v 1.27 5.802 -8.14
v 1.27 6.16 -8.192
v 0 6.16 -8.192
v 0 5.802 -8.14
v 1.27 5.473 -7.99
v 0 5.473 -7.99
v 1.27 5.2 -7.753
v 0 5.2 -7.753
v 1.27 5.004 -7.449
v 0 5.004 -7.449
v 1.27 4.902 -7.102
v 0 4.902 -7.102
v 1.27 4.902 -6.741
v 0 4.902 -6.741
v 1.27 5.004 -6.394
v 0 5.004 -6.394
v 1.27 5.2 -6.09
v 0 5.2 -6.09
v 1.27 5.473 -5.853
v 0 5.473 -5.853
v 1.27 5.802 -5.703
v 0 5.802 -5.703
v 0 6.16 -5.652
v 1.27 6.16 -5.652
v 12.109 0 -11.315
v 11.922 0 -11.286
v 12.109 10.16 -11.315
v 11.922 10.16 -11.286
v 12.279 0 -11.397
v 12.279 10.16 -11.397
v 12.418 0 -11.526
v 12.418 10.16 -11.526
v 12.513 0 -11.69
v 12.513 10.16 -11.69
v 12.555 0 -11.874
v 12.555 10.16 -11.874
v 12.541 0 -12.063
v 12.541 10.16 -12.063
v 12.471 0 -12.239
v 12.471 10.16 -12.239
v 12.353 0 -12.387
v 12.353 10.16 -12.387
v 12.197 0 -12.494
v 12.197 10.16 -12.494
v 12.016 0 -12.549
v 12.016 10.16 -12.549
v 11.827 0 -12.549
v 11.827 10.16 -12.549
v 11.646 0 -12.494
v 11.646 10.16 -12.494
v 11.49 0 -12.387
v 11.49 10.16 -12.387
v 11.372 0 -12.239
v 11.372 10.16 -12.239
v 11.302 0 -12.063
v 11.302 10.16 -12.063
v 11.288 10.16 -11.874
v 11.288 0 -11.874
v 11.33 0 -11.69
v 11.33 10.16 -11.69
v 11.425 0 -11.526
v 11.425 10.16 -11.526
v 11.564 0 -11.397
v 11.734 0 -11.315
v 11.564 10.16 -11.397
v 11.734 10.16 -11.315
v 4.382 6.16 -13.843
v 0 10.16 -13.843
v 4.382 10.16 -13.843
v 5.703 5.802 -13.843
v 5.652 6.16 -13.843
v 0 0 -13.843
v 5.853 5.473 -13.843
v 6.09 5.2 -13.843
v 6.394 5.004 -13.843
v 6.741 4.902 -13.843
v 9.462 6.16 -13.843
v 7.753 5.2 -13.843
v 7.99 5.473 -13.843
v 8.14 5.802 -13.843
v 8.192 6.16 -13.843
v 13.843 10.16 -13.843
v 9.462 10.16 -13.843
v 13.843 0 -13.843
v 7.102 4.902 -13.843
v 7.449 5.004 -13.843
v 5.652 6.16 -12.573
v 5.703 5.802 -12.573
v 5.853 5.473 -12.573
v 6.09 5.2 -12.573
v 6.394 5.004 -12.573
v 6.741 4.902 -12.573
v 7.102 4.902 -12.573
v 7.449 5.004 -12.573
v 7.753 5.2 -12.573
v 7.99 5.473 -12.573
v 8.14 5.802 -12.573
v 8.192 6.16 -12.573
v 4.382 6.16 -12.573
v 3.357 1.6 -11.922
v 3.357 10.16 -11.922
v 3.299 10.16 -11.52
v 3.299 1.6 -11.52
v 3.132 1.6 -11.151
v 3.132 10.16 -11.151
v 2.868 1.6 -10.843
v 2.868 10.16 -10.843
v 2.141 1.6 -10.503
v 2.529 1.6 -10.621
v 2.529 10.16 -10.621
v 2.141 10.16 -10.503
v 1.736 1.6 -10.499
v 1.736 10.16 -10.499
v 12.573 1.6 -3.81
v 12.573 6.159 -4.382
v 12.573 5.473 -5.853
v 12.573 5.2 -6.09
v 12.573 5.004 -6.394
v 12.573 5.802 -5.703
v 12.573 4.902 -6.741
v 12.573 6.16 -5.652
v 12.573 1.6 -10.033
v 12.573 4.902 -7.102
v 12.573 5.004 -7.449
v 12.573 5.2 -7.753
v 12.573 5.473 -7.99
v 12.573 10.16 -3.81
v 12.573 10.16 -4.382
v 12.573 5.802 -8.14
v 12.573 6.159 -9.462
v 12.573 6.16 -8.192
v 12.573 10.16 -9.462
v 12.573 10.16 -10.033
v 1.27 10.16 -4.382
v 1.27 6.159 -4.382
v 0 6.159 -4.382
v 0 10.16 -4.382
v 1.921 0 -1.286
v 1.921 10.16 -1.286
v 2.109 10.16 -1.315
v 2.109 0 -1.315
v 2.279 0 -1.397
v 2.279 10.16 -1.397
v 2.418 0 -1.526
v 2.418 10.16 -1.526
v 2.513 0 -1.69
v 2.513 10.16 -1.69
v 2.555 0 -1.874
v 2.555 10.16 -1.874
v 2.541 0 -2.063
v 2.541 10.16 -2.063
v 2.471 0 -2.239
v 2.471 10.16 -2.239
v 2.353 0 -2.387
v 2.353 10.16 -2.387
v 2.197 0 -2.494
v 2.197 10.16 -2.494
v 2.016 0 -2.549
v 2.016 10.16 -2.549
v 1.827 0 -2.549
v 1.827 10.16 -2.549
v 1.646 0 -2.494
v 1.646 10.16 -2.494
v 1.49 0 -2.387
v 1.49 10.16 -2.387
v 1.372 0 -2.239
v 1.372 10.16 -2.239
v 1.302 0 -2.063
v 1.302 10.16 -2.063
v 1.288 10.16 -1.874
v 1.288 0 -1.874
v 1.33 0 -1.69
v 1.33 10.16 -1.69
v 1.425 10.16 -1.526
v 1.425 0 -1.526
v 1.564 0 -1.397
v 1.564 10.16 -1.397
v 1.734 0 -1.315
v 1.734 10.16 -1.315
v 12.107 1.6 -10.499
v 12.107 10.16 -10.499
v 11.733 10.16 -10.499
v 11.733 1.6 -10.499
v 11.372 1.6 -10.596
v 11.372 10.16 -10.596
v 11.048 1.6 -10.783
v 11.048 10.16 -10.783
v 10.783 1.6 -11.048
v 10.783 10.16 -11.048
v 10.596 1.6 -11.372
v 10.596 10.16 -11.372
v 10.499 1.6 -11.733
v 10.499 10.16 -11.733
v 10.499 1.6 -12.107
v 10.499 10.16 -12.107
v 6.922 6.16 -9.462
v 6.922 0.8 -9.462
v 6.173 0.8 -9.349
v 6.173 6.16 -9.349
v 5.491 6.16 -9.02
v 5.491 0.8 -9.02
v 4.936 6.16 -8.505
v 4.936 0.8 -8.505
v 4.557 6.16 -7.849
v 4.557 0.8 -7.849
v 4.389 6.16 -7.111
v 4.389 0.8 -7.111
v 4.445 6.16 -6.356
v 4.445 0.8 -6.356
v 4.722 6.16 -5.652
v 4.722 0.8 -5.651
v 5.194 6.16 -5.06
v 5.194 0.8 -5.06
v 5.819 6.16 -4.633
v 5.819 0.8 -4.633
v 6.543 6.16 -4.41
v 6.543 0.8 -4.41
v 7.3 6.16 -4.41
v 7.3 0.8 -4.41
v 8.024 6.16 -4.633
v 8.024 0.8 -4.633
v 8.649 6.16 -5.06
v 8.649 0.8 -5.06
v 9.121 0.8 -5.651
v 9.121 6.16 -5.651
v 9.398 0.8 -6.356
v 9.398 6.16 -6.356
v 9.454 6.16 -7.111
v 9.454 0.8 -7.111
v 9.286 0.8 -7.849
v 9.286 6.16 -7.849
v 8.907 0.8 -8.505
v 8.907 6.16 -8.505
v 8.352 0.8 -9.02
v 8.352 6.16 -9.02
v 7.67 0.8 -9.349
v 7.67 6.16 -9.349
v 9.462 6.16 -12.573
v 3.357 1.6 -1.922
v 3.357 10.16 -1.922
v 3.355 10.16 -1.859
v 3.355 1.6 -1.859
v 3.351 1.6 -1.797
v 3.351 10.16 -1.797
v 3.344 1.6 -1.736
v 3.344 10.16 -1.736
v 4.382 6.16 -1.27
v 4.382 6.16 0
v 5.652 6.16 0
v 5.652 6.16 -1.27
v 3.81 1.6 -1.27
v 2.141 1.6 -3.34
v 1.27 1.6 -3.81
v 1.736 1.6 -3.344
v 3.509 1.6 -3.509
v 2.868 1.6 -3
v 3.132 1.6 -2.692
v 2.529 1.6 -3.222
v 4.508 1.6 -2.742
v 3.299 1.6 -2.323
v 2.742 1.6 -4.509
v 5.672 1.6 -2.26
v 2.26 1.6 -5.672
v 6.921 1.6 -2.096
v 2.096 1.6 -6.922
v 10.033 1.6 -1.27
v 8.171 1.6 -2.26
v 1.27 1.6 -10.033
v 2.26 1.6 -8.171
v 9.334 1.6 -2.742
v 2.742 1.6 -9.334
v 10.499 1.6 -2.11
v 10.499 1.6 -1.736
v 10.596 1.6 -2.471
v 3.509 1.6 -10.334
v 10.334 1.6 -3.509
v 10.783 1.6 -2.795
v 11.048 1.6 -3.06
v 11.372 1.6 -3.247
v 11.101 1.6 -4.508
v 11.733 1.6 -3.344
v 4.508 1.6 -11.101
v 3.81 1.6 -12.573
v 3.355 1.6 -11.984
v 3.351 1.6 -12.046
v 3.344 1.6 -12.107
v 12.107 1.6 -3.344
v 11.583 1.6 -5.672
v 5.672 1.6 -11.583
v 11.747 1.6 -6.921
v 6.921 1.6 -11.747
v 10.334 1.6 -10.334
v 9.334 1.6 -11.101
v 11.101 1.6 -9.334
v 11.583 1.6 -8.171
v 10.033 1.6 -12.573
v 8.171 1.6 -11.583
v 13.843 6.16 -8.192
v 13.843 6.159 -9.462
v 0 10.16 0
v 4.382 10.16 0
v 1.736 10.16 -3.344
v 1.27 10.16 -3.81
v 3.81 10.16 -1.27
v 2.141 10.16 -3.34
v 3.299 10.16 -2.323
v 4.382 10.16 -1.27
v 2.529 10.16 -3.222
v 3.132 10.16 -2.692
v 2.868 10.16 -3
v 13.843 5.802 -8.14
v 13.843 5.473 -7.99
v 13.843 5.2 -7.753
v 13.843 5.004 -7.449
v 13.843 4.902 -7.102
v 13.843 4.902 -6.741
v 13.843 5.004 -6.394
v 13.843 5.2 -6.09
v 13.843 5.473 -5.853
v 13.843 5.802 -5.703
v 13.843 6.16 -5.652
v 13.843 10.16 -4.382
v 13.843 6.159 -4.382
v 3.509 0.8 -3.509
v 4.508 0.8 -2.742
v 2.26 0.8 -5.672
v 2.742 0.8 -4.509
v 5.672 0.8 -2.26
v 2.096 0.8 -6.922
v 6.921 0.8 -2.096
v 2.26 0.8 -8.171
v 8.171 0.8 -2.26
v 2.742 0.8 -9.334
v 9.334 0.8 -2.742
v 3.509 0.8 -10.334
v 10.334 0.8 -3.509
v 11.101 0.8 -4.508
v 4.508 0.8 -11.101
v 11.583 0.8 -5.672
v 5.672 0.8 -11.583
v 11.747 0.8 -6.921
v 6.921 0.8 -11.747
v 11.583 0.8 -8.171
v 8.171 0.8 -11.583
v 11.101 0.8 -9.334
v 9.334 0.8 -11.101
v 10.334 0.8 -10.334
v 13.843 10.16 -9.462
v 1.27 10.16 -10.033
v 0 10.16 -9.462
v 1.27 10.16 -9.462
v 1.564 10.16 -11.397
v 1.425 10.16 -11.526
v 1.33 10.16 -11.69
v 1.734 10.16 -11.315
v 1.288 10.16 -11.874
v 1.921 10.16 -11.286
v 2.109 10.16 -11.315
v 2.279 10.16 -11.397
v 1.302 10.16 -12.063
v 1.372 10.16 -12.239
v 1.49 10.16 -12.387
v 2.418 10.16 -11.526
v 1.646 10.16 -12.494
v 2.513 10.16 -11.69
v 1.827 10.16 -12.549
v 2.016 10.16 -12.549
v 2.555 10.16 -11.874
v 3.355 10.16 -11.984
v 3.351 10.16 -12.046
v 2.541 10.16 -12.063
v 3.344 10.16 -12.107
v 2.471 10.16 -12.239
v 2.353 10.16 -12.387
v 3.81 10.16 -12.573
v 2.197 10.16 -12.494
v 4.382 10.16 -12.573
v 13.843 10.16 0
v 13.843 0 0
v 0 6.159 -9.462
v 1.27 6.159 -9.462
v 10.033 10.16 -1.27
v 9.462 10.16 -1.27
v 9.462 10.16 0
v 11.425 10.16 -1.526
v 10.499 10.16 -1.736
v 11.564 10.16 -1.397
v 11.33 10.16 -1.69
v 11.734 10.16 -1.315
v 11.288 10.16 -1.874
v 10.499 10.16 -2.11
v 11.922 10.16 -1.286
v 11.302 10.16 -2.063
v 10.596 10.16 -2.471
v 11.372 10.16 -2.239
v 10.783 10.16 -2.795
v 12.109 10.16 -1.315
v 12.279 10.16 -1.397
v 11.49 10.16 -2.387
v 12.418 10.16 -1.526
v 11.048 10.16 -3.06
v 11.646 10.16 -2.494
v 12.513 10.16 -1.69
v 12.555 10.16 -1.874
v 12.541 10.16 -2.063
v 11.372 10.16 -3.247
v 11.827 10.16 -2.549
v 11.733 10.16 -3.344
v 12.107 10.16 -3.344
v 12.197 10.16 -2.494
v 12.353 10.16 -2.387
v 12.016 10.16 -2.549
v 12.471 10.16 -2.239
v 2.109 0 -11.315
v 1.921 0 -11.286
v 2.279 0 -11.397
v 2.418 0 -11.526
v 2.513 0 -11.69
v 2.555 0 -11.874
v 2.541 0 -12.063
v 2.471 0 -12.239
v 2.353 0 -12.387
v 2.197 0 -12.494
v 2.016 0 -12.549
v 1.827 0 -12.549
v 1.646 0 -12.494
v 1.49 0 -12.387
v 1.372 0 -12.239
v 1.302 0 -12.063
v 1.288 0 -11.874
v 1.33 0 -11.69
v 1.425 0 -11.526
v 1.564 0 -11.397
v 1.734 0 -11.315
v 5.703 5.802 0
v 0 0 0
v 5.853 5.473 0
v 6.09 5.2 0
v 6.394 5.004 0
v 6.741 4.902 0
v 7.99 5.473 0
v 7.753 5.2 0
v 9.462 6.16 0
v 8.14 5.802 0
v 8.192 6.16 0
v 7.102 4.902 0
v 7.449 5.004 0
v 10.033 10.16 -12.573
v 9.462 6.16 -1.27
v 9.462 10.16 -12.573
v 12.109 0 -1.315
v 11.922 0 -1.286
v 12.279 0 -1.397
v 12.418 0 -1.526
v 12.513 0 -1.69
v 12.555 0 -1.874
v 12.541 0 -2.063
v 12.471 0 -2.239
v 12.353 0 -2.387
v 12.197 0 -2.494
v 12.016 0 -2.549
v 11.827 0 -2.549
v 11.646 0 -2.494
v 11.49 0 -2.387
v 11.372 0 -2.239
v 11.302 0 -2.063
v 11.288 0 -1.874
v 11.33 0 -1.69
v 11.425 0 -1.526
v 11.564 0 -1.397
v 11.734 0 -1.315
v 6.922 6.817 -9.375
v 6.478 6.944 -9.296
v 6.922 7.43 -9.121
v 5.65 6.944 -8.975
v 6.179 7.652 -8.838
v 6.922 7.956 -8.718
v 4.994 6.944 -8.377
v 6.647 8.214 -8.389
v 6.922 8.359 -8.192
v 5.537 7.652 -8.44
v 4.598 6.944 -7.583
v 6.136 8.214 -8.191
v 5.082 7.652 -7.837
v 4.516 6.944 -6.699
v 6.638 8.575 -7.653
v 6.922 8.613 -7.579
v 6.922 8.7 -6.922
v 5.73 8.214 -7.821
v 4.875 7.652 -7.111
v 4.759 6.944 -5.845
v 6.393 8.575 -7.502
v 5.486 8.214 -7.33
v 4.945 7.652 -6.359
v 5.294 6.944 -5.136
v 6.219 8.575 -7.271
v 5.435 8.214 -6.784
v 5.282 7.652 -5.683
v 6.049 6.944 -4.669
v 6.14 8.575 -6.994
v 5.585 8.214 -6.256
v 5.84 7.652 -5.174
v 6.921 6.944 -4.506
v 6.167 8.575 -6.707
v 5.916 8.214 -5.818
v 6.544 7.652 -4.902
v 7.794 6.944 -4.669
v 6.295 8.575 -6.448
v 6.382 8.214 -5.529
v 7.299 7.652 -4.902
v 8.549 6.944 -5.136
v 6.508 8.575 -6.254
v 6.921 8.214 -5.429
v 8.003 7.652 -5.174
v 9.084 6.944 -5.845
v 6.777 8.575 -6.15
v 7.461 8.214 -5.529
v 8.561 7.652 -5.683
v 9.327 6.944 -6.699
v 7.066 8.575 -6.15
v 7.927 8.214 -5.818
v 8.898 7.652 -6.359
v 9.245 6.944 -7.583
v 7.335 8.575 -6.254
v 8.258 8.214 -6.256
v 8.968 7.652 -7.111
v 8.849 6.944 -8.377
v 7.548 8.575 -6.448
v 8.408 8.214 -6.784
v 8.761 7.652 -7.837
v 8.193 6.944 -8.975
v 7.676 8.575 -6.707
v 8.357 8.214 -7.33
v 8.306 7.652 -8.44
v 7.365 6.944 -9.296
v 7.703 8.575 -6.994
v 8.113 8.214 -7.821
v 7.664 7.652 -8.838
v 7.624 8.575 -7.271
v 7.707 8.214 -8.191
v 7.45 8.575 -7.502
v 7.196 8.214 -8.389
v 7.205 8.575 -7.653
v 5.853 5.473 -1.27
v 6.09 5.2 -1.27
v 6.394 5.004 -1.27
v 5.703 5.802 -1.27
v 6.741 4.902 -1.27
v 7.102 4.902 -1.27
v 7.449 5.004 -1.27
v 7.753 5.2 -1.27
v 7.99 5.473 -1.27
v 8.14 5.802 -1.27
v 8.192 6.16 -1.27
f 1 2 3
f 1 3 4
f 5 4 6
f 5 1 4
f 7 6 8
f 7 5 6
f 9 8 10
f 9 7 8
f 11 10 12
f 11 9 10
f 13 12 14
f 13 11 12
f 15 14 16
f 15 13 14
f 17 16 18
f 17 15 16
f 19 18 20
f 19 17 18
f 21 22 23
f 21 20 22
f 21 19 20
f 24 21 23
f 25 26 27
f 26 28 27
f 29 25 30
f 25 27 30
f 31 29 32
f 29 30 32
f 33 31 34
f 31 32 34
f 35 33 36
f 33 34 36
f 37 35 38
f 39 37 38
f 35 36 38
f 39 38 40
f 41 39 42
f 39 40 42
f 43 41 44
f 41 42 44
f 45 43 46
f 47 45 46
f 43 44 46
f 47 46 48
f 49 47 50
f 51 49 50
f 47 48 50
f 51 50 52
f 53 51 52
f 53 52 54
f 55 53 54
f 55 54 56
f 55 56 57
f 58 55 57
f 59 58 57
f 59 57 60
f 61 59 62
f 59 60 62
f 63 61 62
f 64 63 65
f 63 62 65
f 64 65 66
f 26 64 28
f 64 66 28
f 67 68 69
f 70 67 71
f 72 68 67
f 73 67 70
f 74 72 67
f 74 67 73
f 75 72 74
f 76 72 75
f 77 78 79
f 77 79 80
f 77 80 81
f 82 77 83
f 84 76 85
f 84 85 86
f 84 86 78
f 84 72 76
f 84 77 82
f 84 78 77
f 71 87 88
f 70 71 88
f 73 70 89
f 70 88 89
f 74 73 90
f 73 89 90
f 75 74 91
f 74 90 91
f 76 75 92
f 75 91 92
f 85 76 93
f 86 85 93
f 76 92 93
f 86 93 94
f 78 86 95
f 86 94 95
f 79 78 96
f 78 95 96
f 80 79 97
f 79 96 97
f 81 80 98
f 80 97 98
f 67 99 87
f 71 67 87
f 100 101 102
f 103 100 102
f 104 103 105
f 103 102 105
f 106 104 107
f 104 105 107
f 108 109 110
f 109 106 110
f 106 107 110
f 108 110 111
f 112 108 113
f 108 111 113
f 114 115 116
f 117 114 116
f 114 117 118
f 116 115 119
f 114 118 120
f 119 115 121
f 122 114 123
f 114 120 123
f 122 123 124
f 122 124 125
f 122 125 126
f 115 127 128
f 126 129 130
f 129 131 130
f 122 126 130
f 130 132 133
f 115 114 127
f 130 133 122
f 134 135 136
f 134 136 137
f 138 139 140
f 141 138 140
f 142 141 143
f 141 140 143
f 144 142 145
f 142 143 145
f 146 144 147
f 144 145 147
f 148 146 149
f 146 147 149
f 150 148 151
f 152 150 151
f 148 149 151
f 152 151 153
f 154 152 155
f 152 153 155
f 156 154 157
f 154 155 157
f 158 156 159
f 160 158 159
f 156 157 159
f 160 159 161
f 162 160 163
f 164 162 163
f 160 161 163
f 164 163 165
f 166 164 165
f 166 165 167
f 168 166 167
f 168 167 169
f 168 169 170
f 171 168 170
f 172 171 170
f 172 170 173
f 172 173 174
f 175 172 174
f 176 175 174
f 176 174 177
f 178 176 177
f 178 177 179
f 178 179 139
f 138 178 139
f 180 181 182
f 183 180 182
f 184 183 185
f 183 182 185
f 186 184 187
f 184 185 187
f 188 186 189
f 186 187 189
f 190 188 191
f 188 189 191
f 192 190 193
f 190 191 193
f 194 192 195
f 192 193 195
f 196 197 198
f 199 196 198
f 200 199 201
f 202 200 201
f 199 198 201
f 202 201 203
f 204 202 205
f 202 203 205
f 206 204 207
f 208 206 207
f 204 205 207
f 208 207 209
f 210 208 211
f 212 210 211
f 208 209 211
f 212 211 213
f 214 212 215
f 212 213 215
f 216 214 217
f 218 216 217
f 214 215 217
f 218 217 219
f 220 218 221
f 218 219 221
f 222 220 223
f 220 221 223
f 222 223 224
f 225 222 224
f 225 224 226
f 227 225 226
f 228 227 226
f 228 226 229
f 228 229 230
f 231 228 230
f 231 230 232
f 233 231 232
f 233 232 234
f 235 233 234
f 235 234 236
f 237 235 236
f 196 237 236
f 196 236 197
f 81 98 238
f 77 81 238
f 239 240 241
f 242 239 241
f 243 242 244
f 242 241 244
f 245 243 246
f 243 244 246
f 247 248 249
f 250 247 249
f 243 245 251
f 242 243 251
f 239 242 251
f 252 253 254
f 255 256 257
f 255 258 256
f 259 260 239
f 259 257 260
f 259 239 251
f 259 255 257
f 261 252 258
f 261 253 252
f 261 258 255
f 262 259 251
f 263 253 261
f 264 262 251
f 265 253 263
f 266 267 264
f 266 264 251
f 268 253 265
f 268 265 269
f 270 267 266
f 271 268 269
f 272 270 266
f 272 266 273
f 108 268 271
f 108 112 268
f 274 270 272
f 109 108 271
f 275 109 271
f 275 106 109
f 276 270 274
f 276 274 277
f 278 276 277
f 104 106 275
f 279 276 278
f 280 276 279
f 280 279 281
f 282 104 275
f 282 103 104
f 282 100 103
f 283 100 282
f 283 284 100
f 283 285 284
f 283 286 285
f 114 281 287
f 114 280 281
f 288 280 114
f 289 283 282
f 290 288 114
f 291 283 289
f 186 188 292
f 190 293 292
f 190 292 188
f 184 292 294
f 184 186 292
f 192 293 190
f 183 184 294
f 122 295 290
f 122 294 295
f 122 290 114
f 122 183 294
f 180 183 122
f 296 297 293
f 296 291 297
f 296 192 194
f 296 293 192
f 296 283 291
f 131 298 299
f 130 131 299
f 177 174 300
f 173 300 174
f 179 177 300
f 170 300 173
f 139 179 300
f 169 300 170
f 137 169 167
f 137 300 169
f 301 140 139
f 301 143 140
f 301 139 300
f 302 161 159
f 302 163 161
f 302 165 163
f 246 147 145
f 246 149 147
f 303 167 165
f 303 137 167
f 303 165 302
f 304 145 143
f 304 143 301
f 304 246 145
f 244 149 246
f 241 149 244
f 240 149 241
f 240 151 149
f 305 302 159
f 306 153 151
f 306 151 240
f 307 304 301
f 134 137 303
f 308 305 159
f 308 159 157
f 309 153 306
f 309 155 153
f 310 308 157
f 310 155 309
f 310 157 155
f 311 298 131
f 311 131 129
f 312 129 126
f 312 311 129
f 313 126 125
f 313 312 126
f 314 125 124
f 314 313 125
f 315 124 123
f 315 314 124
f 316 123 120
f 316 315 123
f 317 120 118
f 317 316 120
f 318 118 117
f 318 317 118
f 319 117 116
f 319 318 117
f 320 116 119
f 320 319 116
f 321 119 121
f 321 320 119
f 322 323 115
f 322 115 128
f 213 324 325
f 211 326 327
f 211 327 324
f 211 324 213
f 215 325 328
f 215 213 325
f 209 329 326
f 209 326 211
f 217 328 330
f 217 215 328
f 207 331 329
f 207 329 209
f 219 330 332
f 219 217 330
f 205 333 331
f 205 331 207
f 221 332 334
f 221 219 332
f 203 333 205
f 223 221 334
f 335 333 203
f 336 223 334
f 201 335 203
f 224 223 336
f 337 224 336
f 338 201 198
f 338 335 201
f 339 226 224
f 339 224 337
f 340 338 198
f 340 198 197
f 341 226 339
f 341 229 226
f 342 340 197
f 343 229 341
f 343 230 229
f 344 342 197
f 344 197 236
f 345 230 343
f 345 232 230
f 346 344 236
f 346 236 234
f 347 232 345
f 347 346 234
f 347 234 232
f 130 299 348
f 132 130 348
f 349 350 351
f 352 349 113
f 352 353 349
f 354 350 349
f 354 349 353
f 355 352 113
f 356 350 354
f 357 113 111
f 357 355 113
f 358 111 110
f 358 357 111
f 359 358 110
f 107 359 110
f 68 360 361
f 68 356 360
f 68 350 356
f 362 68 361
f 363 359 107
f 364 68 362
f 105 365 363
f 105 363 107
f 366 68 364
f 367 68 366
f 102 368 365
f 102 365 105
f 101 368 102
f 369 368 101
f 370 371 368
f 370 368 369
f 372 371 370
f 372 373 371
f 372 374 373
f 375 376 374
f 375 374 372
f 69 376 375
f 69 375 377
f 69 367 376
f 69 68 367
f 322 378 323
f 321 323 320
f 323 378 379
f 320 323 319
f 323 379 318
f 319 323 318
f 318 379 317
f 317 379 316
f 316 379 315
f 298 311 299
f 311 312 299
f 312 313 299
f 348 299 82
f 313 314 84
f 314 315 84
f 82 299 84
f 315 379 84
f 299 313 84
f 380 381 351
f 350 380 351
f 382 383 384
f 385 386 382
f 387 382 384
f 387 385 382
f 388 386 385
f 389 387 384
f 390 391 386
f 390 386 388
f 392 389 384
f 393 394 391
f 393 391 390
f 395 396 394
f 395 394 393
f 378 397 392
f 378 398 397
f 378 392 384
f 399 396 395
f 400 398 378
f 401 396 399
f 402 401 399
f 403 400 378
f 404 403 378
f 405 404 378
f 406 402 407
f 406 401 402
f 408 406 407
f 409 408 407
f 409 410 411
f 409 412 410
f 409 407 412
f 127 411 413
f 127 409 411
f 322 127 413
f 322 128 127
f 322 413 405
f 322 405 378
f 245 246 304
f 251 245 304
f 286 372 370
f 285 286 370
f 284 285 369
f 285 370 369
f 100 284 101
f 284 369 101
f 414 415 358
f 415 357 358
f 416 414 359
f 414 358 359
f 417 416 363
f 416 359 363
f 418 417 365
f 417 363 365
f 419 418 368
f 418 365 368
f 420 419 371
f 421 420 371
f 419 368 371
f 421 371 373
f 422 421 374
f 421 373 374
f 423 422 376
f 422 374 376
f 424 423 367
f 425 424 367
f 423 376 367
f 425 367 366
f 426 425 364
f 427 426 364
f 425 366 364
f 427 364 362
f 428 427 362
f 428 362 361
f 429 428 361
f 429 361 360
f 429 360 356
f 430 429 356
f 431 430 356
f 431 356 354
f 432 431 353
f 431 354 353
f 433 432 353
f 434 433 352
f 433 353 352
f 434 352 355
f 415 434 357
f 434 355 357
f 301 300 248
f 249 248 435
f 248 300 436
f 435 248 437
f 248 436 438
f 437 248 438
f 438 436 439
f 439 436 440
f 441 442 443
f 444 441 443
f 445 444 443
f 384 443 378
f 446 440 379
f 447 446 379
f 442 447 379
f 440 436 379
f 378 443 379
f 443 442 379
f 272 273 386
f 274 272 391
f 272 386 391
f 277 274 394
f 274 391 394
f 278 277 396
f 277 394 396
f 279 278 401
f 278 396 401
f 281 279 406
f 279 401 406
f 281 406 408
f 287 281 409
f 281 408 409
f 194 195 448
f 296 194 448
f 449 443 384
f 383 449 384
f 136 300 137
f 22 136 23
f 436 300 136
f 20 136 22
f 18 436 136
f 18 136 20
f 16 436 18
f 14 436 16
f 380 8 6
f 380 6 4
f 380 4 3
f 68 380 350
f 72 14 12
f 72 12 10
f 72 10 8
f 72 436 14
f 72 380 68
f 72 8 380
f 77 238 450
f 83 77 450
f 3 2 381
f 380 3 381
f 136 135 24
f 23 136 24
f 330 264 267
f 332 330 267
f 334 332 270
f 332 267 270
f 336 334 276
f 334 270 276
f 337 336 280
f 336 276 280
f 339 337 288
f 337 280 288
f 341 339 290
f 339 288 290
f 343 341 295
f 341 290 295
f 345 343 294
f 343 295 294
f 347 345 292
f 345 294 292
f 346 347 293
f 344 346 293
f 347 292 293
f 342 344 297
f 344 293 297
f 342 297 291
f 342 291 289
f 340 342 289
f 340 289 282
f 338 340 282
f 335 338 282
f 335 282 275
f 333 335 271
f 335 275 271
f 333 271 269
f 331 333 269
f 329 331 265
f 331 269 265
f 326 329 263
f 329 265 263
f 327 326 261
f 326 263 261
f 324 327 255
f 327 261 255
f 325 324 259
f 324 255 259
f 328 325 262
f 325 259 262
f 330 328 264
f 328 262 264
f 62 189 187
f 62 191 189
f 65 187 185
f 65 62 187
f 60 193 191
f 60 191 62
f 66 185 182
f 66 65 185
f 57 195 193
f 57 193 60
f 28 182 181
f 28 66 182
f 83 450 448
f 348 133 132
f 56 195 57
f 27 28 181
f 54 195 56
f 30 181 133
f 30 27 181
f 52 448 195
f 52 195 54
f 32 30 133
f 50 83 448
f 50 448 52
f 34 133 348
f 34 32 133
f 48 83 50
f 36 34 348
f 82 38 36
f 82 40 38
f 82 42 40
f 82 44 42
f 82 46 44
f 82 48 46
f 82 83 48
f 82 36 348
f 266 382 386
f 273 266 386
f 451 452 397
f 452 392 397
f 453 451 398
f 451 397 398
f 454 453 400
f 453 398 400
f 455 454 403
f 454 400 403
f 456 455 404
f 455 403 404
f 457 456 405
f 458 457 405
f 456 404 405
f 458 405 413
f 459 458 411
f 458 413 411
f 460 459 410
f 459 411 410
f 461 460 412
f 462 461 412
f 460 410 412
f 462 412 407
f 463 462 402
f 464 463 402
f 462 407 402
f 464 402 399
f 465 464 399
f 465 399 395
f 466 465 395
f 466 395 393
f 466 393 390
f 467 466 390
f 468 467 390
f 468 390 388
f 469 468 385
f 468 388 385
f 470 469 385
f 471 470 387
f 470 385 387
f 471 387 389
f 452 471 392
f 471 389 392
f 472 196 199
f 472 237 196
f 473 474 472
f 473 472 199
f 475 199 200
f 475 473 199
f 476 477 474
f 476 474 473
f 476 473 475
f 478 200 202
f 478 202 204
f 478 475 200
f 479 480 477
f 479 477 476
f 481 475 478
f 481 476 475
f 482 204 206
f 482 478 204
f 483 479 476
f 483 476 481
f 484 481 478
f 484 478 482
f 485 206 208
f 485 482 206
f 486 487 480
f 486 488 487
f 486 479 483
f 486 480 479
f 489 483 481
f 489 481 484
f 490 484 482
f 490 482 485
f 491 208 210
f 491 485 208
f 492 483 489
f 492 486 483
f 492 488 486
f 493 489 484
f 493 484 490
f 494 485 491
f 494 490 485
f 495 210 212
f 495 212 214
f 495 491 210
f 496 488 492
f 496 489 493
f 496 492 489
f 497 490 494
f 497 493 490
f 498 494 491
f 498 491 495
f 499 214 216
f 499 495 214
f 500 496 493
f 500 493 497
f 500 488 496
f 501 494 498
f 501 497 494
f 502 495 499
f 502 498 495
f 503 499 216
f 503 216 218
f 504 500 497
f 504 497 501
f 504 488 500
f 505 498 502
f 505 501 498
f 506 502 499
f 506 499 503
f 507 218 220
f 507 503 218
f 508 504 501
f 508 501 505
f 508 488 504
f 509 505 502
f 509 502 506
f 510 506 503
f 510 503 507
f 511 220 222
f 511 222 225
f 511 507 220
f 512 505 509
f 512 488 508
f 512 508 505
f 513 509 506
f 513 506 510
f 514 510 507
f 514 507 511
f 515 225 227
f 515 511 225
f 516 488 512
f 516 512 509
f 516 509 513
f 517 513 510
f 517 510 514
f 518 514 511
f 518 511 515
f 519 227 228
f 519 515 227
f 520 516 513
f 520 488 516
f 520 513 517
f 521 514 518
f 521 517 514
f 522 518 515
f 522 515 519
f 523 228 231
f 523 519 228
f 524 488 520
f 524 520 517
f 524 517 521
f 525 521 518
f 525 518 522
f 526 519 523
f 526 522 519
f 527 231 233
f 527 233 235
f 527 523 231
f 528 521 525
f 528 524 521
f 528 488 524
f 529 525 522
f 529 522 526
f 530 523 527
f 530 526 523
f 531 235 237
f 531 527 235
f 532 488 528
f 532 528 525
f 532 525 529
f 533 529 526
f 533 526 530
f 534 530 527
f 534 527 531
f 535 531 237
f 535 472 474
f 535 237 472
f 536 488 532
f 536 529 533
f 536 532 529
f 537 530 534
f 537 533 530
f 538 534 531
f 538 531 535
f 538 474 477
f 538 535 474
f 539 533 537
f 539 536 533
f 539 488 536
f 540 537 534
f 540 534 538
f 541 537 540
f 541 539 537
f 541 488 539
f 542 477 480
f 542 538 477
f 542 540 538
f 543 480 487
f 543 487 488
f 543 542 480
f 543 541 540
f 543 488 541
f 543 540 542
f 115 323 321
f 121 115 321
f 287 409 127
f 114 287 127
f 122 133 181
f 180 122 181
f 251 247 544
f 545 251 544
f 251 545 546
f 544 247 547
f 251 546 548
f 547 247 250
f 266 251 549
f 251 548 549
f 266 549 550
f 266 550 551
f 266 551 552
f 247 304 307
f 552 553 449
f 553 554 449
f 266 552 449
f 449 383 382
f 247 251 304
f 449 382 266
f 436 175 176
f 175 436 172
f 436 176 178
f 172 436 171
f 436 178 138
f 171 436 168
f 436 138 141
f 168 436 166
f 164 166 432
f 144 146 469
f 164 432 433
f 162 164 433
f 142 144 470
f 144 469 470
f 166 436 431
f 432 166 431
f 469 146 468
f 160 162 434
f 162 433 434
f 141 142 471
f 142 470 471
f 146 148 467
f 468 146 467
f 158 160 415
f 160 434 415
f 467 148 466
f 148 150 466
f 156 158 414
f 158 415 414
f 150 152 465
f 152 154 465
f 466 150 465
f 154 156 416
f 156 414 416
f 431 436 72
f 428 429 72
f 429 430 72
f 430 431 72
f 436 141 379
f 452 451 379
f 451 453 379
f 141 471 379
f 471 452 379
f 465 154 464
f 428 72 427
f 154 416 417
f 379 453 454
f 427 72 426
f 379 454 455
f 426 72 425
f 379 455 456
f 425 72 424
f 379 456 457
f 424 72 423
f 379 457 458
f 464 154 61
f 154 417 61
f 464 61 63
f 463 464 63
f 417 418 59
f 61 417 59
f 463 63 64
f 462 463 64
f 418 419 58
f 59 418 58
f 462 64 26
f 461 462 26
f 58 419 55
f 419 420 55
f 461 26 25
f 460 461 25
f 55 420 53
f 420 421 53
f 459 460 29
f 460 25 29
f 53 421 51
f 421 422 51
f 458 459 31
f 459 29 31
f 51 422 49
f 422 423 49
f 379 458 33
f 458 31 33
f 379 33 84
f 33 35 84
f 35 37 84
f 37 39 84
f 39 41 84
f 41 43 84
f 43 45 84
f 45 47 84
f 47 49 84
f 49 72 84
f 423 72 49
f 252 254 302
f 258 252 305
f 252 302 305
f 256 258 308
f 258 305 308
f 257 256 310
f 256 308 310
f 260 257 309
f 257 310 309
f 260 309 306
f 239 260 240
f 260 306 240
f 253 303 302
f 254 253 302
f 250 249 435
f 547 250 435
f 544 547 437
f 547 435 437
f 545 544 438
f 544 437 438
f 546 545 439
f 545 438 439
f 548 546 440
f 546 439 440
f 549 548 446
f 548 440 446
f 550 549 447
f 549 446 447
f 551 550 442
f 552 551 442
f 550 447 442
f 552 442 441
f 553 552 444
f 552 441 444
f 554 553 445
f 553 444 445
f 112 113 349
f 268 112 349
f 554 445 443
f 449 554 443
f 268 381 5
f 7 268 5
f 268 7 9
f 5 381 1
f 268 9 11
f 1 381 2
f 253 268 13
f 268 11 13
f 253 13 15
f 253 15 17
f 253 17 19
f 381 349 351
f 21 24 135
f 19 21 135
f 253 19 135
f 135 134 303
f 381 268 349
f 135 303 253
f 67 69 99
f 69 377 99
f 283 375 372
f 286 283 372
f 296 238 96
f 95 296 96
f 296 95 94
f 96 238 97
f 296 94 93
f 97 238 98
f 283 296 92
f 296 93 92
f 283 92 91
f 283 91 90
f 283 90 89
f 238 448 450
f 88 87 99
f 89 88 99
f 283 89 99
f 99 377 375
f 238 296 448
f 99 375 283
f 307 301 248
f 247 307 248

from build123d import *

# Parameters (mm, degrees)
SKETCH1_W                     = 13.843
SKETCH1_H                     = 13.843
MAIN_BODY_EXTRUDE_DEPTH       = 10.16
MAIN_BODY_CUT_DEPTH           = 9.36
SKETCH21_R                    = 0.635
SCREW_HOLES_CUT_DEPTH         = 23.056357315
X_AXIS_SLOT_DEPTH             = 23.056357315
SKETCH6_W                     = 5.08
SKETCH6_H                     = 6.485700116
Y_AXIS_SLOT_DEPTH             = 23.056357315
SPRING_START                  = 0.8
SKETCH11_W                    = 11.303
SKETCH11_H                    = 11.303
SKETCH11_R                    = 4.826
SKETCH11_R_2                  = 0.635
SPRING_RETAINER_EXTRUDE_DEPTH = 0.8
SKETCH12_R                    = 2.54
STICK_SUPPORT_DEPTH           = 5.3595
SKETCH20_R                    = 2.54
BOSS_EXTRUDE9_DEPTH           = 2.54
FILLET4_R                     = 2.54


with BuildPart() as part:
    # Sketch1 → main body extrude (new body)
    with BuildSketch(Plane(origin=(0, 0, 0), x_dir=(1, 0, 0), z_dir=(0, 1, 0))):
        with Locations((6.9215, 6.9215)):
            Rectangle(SKETCH1_W, SKETCH1_H)
    extrude(amount=MAIN_BODY_EXTRUDE_DEPTH)

    # Sketch4 → main body cut (cut)
    with BuildSketch(Plane(origin=(0, 10.16, 0), x_dir=(1, 0, 0), z_dir=(0, 1, 0))):
        with BuildLine():
            Line((1.735593231, 10.498593231), (1.27, 10.033))
            Line((1.27, 10.033), (1.27, 3.81))
            Line((1.27, 3.81), (1.735593231, 3.344406769))
            ThreePointArc((1.735593231, 3.344406769), (2.868191287, 2.999925058), (3.3565, 1.9215))
            ThreePointArc((3.3565, 1.9215), (3.353473501, 1.828350157), (3.344406769, 1.735593231))
            Line((3.344406769, 1.735593231), (3.81, 1.27))
            Line((3.81, 1.27), (10.033, 1.27))
            Line((10.033, 1.27), (10.498593231, 1.735593231))
            ThreePointArc((10.498593231, 1.735593231), (10.906801769, 2.936198231), (12.107406769, 3.344406769))
            Line((12.107406769, 3.344406769), (12.573, 3.81))
            Line((12.573, 3.81), (12.573, 10.033))
            Line((12.573, 10.033), (12.107406769, 10.498593231))
            ThreePointArc((12.107406769, 10.498593231), (10.906801769, 10.906801769), (10.498593231, 12.107406769))
            Line((10.498593231, 12.107406769), (10.033, 12.573))
            Line((10.033, 12.573), (3.81, 12.573))
            Line((3.81, 12.573), (3.344406769, 12.107406769))
            ThreePointArc((3.344406769, 12.107406769), (3.353473501, 12.014649843), (3.3565, 11.9215))
            ThreePointArc((3.3565, 11.9215), (2.868191287, 10.843074942), (1.735593231, 10.498593231))
        make_face()
    extrude(amount=-MAIN_BODY_CUT_DEPTH, mode=Mode.SUBTRACT)

    # Sketch21 → screw holes cut (cut, through all)
    with BuildSketch(Plane(origin=(0, 10.16, 0), x_dir=(1, 0, 0), z_dir=(0, 1, 0))):
        with Locations(Location((1.9215, 11.9215, 0), (0, 0, 270))):
            Circle(SKETCH21_R)
        with Locations(Location((11.9215, 11.9215, 0), (0, 0, 270))):
            Circle(SKETCH21_R)
        with Locations(Location((11.9215, 1.9215, 0), (0, 0, 270))):
            Circle(SKETCH21_R)
        with Locations(Location((1.9215, 1.9215, 0), (0, 0, 270))):
            Circle(SKETCH21_R)
    extrude(amount=-SCREW_HOLES_CUT_DEPTH, mode=Mode.SUBTRACT)

    # Sketch5 → x axis slot (cut, through all)
    with BuildSketch(Plane.XY):
        with BuildLine():
            Line((9.4615, 12.711621125), (4.3815, 12.711621125))
            Line((4.3815, 12.711621125), (4.3815, 6.1595))
            Line((4.3815, 6.1595), (5.6515, 6.1595))
            ThreePointArc((5.6515, 6.1595), (6.9215, 4.8895), (8.1915, 6.1595))
            Line((8.1915, 6.1595), (9.4615, 6.1595))
            Line((9.4615, 6.1595), (9.4615, 12.711621125))
        make_face()
    extrude(amount=-X_AXIS_SLOT_DEPTH, mode=Mode.SUBTRACT)

    # Sketch6 → y axis slot (cut, through all)
    with BuildSketch(Plane(origin=(13.843, 0, 0), x_dir=(0, 0, -1), z_dir=(1, 0, 0))):
        with BuildLine():
            Line((5.6515, 6.1595), (5.6515, 12.645200116))
            ThreePointArc((5.6515, 12.645200116), (6.9215, 13.915200116), (8.1915, 12.645200116))
            Line((8.1915, 12.645200116), (8.1915, 6.1595))
            ThreePointArc((8.1915, 6.1595), (6.9215, 4.8895), (5.6515, 6.1595))
        make_face()
        with Locations((6.9215, 9.402350058)):
            Rectangle(SKETCH6_W, SKETCH6_H)
    extrude(amount=-Y_AXIS_SLOT_DEPTH, mode=Mode.SUBTRACT)

    # Sketch11 → spring retainer extrude (add)
    with BuildSketch(Plane(origin=(0, 0.8, 0), x_dir=(1, 0, 0), z_dir=(0, 1, 0)).offset(SPRING_START)):
        with Locations((6.9215, 6.9215)):
            Rectangle(SKETCH11_W, SKETCH11_H)
        with Locations(Location((6.9215, 6.9215, 0), (0, 0, 270))):
            Circle(SKETCH11_R, mode=Mode.SUBTRACT)
        with Locations(Location((1.9215, 11.9215, 0), (0, 0, 270))):
            Circle(SKETCH11_R_2, mode=Mode.SUBTRACT)
        with Locations(Location((11.9215, 11.9215, 0), (0, 0, 270))):
            Circle(SKETCH11_R_2, mode=Mode.SUBTRACT)
        with Locations(Location((11.9215, 1.9215, 0), (0, 0, 270))):
            Circle(SKETCH11_R_2, mode=Mode.SUBTRACT)
        with Locations(Location((1.9215, 1.9215, 0), (0, 0, 270))):
            Circle(SKETCH11_R_2, mode=Mode.SUBTRACT)
    extrude(amount=-SPRING_RETAINER_EXTRUDE_DEPTH)

    # Sketch12 → Stick support (add)
    with BuildSketch(Plane(origin=(0, 0.8, 0), x_dir=(1, 0, 0), z_dir=(0, 1, 0))):
        with Locations(Location((6.9215, 6.9215, 0), (0, 0, 90))):
            Circle(SKETCH12_R)
    extrude(amount=STICK_SUPPORT_DEPTH)

    # Sketch20 → Boss-Extrude9 (add)
    with BuildSketch(Plane(origin=(0, 6.1595, 0), x_dir=(1, 0, 0), z_dir=(0, 1, 0))):
        with Locations(Location((6.9215, 6.9215, 0), (0, 0, 90))):
            Circle(SKETCH20_R)
    extrude(amount=BOSS_EXTRUDE9_DEPTH)

    # Fillet4
    fillet4_edges = [part.edges().sort_by_distance(p)[0] for p in [
        (6.9215, 8.6995, -4.3815),
    ]]
    fillet(fillet4_edges, radius=FILLET4_R)


solid = part.part
